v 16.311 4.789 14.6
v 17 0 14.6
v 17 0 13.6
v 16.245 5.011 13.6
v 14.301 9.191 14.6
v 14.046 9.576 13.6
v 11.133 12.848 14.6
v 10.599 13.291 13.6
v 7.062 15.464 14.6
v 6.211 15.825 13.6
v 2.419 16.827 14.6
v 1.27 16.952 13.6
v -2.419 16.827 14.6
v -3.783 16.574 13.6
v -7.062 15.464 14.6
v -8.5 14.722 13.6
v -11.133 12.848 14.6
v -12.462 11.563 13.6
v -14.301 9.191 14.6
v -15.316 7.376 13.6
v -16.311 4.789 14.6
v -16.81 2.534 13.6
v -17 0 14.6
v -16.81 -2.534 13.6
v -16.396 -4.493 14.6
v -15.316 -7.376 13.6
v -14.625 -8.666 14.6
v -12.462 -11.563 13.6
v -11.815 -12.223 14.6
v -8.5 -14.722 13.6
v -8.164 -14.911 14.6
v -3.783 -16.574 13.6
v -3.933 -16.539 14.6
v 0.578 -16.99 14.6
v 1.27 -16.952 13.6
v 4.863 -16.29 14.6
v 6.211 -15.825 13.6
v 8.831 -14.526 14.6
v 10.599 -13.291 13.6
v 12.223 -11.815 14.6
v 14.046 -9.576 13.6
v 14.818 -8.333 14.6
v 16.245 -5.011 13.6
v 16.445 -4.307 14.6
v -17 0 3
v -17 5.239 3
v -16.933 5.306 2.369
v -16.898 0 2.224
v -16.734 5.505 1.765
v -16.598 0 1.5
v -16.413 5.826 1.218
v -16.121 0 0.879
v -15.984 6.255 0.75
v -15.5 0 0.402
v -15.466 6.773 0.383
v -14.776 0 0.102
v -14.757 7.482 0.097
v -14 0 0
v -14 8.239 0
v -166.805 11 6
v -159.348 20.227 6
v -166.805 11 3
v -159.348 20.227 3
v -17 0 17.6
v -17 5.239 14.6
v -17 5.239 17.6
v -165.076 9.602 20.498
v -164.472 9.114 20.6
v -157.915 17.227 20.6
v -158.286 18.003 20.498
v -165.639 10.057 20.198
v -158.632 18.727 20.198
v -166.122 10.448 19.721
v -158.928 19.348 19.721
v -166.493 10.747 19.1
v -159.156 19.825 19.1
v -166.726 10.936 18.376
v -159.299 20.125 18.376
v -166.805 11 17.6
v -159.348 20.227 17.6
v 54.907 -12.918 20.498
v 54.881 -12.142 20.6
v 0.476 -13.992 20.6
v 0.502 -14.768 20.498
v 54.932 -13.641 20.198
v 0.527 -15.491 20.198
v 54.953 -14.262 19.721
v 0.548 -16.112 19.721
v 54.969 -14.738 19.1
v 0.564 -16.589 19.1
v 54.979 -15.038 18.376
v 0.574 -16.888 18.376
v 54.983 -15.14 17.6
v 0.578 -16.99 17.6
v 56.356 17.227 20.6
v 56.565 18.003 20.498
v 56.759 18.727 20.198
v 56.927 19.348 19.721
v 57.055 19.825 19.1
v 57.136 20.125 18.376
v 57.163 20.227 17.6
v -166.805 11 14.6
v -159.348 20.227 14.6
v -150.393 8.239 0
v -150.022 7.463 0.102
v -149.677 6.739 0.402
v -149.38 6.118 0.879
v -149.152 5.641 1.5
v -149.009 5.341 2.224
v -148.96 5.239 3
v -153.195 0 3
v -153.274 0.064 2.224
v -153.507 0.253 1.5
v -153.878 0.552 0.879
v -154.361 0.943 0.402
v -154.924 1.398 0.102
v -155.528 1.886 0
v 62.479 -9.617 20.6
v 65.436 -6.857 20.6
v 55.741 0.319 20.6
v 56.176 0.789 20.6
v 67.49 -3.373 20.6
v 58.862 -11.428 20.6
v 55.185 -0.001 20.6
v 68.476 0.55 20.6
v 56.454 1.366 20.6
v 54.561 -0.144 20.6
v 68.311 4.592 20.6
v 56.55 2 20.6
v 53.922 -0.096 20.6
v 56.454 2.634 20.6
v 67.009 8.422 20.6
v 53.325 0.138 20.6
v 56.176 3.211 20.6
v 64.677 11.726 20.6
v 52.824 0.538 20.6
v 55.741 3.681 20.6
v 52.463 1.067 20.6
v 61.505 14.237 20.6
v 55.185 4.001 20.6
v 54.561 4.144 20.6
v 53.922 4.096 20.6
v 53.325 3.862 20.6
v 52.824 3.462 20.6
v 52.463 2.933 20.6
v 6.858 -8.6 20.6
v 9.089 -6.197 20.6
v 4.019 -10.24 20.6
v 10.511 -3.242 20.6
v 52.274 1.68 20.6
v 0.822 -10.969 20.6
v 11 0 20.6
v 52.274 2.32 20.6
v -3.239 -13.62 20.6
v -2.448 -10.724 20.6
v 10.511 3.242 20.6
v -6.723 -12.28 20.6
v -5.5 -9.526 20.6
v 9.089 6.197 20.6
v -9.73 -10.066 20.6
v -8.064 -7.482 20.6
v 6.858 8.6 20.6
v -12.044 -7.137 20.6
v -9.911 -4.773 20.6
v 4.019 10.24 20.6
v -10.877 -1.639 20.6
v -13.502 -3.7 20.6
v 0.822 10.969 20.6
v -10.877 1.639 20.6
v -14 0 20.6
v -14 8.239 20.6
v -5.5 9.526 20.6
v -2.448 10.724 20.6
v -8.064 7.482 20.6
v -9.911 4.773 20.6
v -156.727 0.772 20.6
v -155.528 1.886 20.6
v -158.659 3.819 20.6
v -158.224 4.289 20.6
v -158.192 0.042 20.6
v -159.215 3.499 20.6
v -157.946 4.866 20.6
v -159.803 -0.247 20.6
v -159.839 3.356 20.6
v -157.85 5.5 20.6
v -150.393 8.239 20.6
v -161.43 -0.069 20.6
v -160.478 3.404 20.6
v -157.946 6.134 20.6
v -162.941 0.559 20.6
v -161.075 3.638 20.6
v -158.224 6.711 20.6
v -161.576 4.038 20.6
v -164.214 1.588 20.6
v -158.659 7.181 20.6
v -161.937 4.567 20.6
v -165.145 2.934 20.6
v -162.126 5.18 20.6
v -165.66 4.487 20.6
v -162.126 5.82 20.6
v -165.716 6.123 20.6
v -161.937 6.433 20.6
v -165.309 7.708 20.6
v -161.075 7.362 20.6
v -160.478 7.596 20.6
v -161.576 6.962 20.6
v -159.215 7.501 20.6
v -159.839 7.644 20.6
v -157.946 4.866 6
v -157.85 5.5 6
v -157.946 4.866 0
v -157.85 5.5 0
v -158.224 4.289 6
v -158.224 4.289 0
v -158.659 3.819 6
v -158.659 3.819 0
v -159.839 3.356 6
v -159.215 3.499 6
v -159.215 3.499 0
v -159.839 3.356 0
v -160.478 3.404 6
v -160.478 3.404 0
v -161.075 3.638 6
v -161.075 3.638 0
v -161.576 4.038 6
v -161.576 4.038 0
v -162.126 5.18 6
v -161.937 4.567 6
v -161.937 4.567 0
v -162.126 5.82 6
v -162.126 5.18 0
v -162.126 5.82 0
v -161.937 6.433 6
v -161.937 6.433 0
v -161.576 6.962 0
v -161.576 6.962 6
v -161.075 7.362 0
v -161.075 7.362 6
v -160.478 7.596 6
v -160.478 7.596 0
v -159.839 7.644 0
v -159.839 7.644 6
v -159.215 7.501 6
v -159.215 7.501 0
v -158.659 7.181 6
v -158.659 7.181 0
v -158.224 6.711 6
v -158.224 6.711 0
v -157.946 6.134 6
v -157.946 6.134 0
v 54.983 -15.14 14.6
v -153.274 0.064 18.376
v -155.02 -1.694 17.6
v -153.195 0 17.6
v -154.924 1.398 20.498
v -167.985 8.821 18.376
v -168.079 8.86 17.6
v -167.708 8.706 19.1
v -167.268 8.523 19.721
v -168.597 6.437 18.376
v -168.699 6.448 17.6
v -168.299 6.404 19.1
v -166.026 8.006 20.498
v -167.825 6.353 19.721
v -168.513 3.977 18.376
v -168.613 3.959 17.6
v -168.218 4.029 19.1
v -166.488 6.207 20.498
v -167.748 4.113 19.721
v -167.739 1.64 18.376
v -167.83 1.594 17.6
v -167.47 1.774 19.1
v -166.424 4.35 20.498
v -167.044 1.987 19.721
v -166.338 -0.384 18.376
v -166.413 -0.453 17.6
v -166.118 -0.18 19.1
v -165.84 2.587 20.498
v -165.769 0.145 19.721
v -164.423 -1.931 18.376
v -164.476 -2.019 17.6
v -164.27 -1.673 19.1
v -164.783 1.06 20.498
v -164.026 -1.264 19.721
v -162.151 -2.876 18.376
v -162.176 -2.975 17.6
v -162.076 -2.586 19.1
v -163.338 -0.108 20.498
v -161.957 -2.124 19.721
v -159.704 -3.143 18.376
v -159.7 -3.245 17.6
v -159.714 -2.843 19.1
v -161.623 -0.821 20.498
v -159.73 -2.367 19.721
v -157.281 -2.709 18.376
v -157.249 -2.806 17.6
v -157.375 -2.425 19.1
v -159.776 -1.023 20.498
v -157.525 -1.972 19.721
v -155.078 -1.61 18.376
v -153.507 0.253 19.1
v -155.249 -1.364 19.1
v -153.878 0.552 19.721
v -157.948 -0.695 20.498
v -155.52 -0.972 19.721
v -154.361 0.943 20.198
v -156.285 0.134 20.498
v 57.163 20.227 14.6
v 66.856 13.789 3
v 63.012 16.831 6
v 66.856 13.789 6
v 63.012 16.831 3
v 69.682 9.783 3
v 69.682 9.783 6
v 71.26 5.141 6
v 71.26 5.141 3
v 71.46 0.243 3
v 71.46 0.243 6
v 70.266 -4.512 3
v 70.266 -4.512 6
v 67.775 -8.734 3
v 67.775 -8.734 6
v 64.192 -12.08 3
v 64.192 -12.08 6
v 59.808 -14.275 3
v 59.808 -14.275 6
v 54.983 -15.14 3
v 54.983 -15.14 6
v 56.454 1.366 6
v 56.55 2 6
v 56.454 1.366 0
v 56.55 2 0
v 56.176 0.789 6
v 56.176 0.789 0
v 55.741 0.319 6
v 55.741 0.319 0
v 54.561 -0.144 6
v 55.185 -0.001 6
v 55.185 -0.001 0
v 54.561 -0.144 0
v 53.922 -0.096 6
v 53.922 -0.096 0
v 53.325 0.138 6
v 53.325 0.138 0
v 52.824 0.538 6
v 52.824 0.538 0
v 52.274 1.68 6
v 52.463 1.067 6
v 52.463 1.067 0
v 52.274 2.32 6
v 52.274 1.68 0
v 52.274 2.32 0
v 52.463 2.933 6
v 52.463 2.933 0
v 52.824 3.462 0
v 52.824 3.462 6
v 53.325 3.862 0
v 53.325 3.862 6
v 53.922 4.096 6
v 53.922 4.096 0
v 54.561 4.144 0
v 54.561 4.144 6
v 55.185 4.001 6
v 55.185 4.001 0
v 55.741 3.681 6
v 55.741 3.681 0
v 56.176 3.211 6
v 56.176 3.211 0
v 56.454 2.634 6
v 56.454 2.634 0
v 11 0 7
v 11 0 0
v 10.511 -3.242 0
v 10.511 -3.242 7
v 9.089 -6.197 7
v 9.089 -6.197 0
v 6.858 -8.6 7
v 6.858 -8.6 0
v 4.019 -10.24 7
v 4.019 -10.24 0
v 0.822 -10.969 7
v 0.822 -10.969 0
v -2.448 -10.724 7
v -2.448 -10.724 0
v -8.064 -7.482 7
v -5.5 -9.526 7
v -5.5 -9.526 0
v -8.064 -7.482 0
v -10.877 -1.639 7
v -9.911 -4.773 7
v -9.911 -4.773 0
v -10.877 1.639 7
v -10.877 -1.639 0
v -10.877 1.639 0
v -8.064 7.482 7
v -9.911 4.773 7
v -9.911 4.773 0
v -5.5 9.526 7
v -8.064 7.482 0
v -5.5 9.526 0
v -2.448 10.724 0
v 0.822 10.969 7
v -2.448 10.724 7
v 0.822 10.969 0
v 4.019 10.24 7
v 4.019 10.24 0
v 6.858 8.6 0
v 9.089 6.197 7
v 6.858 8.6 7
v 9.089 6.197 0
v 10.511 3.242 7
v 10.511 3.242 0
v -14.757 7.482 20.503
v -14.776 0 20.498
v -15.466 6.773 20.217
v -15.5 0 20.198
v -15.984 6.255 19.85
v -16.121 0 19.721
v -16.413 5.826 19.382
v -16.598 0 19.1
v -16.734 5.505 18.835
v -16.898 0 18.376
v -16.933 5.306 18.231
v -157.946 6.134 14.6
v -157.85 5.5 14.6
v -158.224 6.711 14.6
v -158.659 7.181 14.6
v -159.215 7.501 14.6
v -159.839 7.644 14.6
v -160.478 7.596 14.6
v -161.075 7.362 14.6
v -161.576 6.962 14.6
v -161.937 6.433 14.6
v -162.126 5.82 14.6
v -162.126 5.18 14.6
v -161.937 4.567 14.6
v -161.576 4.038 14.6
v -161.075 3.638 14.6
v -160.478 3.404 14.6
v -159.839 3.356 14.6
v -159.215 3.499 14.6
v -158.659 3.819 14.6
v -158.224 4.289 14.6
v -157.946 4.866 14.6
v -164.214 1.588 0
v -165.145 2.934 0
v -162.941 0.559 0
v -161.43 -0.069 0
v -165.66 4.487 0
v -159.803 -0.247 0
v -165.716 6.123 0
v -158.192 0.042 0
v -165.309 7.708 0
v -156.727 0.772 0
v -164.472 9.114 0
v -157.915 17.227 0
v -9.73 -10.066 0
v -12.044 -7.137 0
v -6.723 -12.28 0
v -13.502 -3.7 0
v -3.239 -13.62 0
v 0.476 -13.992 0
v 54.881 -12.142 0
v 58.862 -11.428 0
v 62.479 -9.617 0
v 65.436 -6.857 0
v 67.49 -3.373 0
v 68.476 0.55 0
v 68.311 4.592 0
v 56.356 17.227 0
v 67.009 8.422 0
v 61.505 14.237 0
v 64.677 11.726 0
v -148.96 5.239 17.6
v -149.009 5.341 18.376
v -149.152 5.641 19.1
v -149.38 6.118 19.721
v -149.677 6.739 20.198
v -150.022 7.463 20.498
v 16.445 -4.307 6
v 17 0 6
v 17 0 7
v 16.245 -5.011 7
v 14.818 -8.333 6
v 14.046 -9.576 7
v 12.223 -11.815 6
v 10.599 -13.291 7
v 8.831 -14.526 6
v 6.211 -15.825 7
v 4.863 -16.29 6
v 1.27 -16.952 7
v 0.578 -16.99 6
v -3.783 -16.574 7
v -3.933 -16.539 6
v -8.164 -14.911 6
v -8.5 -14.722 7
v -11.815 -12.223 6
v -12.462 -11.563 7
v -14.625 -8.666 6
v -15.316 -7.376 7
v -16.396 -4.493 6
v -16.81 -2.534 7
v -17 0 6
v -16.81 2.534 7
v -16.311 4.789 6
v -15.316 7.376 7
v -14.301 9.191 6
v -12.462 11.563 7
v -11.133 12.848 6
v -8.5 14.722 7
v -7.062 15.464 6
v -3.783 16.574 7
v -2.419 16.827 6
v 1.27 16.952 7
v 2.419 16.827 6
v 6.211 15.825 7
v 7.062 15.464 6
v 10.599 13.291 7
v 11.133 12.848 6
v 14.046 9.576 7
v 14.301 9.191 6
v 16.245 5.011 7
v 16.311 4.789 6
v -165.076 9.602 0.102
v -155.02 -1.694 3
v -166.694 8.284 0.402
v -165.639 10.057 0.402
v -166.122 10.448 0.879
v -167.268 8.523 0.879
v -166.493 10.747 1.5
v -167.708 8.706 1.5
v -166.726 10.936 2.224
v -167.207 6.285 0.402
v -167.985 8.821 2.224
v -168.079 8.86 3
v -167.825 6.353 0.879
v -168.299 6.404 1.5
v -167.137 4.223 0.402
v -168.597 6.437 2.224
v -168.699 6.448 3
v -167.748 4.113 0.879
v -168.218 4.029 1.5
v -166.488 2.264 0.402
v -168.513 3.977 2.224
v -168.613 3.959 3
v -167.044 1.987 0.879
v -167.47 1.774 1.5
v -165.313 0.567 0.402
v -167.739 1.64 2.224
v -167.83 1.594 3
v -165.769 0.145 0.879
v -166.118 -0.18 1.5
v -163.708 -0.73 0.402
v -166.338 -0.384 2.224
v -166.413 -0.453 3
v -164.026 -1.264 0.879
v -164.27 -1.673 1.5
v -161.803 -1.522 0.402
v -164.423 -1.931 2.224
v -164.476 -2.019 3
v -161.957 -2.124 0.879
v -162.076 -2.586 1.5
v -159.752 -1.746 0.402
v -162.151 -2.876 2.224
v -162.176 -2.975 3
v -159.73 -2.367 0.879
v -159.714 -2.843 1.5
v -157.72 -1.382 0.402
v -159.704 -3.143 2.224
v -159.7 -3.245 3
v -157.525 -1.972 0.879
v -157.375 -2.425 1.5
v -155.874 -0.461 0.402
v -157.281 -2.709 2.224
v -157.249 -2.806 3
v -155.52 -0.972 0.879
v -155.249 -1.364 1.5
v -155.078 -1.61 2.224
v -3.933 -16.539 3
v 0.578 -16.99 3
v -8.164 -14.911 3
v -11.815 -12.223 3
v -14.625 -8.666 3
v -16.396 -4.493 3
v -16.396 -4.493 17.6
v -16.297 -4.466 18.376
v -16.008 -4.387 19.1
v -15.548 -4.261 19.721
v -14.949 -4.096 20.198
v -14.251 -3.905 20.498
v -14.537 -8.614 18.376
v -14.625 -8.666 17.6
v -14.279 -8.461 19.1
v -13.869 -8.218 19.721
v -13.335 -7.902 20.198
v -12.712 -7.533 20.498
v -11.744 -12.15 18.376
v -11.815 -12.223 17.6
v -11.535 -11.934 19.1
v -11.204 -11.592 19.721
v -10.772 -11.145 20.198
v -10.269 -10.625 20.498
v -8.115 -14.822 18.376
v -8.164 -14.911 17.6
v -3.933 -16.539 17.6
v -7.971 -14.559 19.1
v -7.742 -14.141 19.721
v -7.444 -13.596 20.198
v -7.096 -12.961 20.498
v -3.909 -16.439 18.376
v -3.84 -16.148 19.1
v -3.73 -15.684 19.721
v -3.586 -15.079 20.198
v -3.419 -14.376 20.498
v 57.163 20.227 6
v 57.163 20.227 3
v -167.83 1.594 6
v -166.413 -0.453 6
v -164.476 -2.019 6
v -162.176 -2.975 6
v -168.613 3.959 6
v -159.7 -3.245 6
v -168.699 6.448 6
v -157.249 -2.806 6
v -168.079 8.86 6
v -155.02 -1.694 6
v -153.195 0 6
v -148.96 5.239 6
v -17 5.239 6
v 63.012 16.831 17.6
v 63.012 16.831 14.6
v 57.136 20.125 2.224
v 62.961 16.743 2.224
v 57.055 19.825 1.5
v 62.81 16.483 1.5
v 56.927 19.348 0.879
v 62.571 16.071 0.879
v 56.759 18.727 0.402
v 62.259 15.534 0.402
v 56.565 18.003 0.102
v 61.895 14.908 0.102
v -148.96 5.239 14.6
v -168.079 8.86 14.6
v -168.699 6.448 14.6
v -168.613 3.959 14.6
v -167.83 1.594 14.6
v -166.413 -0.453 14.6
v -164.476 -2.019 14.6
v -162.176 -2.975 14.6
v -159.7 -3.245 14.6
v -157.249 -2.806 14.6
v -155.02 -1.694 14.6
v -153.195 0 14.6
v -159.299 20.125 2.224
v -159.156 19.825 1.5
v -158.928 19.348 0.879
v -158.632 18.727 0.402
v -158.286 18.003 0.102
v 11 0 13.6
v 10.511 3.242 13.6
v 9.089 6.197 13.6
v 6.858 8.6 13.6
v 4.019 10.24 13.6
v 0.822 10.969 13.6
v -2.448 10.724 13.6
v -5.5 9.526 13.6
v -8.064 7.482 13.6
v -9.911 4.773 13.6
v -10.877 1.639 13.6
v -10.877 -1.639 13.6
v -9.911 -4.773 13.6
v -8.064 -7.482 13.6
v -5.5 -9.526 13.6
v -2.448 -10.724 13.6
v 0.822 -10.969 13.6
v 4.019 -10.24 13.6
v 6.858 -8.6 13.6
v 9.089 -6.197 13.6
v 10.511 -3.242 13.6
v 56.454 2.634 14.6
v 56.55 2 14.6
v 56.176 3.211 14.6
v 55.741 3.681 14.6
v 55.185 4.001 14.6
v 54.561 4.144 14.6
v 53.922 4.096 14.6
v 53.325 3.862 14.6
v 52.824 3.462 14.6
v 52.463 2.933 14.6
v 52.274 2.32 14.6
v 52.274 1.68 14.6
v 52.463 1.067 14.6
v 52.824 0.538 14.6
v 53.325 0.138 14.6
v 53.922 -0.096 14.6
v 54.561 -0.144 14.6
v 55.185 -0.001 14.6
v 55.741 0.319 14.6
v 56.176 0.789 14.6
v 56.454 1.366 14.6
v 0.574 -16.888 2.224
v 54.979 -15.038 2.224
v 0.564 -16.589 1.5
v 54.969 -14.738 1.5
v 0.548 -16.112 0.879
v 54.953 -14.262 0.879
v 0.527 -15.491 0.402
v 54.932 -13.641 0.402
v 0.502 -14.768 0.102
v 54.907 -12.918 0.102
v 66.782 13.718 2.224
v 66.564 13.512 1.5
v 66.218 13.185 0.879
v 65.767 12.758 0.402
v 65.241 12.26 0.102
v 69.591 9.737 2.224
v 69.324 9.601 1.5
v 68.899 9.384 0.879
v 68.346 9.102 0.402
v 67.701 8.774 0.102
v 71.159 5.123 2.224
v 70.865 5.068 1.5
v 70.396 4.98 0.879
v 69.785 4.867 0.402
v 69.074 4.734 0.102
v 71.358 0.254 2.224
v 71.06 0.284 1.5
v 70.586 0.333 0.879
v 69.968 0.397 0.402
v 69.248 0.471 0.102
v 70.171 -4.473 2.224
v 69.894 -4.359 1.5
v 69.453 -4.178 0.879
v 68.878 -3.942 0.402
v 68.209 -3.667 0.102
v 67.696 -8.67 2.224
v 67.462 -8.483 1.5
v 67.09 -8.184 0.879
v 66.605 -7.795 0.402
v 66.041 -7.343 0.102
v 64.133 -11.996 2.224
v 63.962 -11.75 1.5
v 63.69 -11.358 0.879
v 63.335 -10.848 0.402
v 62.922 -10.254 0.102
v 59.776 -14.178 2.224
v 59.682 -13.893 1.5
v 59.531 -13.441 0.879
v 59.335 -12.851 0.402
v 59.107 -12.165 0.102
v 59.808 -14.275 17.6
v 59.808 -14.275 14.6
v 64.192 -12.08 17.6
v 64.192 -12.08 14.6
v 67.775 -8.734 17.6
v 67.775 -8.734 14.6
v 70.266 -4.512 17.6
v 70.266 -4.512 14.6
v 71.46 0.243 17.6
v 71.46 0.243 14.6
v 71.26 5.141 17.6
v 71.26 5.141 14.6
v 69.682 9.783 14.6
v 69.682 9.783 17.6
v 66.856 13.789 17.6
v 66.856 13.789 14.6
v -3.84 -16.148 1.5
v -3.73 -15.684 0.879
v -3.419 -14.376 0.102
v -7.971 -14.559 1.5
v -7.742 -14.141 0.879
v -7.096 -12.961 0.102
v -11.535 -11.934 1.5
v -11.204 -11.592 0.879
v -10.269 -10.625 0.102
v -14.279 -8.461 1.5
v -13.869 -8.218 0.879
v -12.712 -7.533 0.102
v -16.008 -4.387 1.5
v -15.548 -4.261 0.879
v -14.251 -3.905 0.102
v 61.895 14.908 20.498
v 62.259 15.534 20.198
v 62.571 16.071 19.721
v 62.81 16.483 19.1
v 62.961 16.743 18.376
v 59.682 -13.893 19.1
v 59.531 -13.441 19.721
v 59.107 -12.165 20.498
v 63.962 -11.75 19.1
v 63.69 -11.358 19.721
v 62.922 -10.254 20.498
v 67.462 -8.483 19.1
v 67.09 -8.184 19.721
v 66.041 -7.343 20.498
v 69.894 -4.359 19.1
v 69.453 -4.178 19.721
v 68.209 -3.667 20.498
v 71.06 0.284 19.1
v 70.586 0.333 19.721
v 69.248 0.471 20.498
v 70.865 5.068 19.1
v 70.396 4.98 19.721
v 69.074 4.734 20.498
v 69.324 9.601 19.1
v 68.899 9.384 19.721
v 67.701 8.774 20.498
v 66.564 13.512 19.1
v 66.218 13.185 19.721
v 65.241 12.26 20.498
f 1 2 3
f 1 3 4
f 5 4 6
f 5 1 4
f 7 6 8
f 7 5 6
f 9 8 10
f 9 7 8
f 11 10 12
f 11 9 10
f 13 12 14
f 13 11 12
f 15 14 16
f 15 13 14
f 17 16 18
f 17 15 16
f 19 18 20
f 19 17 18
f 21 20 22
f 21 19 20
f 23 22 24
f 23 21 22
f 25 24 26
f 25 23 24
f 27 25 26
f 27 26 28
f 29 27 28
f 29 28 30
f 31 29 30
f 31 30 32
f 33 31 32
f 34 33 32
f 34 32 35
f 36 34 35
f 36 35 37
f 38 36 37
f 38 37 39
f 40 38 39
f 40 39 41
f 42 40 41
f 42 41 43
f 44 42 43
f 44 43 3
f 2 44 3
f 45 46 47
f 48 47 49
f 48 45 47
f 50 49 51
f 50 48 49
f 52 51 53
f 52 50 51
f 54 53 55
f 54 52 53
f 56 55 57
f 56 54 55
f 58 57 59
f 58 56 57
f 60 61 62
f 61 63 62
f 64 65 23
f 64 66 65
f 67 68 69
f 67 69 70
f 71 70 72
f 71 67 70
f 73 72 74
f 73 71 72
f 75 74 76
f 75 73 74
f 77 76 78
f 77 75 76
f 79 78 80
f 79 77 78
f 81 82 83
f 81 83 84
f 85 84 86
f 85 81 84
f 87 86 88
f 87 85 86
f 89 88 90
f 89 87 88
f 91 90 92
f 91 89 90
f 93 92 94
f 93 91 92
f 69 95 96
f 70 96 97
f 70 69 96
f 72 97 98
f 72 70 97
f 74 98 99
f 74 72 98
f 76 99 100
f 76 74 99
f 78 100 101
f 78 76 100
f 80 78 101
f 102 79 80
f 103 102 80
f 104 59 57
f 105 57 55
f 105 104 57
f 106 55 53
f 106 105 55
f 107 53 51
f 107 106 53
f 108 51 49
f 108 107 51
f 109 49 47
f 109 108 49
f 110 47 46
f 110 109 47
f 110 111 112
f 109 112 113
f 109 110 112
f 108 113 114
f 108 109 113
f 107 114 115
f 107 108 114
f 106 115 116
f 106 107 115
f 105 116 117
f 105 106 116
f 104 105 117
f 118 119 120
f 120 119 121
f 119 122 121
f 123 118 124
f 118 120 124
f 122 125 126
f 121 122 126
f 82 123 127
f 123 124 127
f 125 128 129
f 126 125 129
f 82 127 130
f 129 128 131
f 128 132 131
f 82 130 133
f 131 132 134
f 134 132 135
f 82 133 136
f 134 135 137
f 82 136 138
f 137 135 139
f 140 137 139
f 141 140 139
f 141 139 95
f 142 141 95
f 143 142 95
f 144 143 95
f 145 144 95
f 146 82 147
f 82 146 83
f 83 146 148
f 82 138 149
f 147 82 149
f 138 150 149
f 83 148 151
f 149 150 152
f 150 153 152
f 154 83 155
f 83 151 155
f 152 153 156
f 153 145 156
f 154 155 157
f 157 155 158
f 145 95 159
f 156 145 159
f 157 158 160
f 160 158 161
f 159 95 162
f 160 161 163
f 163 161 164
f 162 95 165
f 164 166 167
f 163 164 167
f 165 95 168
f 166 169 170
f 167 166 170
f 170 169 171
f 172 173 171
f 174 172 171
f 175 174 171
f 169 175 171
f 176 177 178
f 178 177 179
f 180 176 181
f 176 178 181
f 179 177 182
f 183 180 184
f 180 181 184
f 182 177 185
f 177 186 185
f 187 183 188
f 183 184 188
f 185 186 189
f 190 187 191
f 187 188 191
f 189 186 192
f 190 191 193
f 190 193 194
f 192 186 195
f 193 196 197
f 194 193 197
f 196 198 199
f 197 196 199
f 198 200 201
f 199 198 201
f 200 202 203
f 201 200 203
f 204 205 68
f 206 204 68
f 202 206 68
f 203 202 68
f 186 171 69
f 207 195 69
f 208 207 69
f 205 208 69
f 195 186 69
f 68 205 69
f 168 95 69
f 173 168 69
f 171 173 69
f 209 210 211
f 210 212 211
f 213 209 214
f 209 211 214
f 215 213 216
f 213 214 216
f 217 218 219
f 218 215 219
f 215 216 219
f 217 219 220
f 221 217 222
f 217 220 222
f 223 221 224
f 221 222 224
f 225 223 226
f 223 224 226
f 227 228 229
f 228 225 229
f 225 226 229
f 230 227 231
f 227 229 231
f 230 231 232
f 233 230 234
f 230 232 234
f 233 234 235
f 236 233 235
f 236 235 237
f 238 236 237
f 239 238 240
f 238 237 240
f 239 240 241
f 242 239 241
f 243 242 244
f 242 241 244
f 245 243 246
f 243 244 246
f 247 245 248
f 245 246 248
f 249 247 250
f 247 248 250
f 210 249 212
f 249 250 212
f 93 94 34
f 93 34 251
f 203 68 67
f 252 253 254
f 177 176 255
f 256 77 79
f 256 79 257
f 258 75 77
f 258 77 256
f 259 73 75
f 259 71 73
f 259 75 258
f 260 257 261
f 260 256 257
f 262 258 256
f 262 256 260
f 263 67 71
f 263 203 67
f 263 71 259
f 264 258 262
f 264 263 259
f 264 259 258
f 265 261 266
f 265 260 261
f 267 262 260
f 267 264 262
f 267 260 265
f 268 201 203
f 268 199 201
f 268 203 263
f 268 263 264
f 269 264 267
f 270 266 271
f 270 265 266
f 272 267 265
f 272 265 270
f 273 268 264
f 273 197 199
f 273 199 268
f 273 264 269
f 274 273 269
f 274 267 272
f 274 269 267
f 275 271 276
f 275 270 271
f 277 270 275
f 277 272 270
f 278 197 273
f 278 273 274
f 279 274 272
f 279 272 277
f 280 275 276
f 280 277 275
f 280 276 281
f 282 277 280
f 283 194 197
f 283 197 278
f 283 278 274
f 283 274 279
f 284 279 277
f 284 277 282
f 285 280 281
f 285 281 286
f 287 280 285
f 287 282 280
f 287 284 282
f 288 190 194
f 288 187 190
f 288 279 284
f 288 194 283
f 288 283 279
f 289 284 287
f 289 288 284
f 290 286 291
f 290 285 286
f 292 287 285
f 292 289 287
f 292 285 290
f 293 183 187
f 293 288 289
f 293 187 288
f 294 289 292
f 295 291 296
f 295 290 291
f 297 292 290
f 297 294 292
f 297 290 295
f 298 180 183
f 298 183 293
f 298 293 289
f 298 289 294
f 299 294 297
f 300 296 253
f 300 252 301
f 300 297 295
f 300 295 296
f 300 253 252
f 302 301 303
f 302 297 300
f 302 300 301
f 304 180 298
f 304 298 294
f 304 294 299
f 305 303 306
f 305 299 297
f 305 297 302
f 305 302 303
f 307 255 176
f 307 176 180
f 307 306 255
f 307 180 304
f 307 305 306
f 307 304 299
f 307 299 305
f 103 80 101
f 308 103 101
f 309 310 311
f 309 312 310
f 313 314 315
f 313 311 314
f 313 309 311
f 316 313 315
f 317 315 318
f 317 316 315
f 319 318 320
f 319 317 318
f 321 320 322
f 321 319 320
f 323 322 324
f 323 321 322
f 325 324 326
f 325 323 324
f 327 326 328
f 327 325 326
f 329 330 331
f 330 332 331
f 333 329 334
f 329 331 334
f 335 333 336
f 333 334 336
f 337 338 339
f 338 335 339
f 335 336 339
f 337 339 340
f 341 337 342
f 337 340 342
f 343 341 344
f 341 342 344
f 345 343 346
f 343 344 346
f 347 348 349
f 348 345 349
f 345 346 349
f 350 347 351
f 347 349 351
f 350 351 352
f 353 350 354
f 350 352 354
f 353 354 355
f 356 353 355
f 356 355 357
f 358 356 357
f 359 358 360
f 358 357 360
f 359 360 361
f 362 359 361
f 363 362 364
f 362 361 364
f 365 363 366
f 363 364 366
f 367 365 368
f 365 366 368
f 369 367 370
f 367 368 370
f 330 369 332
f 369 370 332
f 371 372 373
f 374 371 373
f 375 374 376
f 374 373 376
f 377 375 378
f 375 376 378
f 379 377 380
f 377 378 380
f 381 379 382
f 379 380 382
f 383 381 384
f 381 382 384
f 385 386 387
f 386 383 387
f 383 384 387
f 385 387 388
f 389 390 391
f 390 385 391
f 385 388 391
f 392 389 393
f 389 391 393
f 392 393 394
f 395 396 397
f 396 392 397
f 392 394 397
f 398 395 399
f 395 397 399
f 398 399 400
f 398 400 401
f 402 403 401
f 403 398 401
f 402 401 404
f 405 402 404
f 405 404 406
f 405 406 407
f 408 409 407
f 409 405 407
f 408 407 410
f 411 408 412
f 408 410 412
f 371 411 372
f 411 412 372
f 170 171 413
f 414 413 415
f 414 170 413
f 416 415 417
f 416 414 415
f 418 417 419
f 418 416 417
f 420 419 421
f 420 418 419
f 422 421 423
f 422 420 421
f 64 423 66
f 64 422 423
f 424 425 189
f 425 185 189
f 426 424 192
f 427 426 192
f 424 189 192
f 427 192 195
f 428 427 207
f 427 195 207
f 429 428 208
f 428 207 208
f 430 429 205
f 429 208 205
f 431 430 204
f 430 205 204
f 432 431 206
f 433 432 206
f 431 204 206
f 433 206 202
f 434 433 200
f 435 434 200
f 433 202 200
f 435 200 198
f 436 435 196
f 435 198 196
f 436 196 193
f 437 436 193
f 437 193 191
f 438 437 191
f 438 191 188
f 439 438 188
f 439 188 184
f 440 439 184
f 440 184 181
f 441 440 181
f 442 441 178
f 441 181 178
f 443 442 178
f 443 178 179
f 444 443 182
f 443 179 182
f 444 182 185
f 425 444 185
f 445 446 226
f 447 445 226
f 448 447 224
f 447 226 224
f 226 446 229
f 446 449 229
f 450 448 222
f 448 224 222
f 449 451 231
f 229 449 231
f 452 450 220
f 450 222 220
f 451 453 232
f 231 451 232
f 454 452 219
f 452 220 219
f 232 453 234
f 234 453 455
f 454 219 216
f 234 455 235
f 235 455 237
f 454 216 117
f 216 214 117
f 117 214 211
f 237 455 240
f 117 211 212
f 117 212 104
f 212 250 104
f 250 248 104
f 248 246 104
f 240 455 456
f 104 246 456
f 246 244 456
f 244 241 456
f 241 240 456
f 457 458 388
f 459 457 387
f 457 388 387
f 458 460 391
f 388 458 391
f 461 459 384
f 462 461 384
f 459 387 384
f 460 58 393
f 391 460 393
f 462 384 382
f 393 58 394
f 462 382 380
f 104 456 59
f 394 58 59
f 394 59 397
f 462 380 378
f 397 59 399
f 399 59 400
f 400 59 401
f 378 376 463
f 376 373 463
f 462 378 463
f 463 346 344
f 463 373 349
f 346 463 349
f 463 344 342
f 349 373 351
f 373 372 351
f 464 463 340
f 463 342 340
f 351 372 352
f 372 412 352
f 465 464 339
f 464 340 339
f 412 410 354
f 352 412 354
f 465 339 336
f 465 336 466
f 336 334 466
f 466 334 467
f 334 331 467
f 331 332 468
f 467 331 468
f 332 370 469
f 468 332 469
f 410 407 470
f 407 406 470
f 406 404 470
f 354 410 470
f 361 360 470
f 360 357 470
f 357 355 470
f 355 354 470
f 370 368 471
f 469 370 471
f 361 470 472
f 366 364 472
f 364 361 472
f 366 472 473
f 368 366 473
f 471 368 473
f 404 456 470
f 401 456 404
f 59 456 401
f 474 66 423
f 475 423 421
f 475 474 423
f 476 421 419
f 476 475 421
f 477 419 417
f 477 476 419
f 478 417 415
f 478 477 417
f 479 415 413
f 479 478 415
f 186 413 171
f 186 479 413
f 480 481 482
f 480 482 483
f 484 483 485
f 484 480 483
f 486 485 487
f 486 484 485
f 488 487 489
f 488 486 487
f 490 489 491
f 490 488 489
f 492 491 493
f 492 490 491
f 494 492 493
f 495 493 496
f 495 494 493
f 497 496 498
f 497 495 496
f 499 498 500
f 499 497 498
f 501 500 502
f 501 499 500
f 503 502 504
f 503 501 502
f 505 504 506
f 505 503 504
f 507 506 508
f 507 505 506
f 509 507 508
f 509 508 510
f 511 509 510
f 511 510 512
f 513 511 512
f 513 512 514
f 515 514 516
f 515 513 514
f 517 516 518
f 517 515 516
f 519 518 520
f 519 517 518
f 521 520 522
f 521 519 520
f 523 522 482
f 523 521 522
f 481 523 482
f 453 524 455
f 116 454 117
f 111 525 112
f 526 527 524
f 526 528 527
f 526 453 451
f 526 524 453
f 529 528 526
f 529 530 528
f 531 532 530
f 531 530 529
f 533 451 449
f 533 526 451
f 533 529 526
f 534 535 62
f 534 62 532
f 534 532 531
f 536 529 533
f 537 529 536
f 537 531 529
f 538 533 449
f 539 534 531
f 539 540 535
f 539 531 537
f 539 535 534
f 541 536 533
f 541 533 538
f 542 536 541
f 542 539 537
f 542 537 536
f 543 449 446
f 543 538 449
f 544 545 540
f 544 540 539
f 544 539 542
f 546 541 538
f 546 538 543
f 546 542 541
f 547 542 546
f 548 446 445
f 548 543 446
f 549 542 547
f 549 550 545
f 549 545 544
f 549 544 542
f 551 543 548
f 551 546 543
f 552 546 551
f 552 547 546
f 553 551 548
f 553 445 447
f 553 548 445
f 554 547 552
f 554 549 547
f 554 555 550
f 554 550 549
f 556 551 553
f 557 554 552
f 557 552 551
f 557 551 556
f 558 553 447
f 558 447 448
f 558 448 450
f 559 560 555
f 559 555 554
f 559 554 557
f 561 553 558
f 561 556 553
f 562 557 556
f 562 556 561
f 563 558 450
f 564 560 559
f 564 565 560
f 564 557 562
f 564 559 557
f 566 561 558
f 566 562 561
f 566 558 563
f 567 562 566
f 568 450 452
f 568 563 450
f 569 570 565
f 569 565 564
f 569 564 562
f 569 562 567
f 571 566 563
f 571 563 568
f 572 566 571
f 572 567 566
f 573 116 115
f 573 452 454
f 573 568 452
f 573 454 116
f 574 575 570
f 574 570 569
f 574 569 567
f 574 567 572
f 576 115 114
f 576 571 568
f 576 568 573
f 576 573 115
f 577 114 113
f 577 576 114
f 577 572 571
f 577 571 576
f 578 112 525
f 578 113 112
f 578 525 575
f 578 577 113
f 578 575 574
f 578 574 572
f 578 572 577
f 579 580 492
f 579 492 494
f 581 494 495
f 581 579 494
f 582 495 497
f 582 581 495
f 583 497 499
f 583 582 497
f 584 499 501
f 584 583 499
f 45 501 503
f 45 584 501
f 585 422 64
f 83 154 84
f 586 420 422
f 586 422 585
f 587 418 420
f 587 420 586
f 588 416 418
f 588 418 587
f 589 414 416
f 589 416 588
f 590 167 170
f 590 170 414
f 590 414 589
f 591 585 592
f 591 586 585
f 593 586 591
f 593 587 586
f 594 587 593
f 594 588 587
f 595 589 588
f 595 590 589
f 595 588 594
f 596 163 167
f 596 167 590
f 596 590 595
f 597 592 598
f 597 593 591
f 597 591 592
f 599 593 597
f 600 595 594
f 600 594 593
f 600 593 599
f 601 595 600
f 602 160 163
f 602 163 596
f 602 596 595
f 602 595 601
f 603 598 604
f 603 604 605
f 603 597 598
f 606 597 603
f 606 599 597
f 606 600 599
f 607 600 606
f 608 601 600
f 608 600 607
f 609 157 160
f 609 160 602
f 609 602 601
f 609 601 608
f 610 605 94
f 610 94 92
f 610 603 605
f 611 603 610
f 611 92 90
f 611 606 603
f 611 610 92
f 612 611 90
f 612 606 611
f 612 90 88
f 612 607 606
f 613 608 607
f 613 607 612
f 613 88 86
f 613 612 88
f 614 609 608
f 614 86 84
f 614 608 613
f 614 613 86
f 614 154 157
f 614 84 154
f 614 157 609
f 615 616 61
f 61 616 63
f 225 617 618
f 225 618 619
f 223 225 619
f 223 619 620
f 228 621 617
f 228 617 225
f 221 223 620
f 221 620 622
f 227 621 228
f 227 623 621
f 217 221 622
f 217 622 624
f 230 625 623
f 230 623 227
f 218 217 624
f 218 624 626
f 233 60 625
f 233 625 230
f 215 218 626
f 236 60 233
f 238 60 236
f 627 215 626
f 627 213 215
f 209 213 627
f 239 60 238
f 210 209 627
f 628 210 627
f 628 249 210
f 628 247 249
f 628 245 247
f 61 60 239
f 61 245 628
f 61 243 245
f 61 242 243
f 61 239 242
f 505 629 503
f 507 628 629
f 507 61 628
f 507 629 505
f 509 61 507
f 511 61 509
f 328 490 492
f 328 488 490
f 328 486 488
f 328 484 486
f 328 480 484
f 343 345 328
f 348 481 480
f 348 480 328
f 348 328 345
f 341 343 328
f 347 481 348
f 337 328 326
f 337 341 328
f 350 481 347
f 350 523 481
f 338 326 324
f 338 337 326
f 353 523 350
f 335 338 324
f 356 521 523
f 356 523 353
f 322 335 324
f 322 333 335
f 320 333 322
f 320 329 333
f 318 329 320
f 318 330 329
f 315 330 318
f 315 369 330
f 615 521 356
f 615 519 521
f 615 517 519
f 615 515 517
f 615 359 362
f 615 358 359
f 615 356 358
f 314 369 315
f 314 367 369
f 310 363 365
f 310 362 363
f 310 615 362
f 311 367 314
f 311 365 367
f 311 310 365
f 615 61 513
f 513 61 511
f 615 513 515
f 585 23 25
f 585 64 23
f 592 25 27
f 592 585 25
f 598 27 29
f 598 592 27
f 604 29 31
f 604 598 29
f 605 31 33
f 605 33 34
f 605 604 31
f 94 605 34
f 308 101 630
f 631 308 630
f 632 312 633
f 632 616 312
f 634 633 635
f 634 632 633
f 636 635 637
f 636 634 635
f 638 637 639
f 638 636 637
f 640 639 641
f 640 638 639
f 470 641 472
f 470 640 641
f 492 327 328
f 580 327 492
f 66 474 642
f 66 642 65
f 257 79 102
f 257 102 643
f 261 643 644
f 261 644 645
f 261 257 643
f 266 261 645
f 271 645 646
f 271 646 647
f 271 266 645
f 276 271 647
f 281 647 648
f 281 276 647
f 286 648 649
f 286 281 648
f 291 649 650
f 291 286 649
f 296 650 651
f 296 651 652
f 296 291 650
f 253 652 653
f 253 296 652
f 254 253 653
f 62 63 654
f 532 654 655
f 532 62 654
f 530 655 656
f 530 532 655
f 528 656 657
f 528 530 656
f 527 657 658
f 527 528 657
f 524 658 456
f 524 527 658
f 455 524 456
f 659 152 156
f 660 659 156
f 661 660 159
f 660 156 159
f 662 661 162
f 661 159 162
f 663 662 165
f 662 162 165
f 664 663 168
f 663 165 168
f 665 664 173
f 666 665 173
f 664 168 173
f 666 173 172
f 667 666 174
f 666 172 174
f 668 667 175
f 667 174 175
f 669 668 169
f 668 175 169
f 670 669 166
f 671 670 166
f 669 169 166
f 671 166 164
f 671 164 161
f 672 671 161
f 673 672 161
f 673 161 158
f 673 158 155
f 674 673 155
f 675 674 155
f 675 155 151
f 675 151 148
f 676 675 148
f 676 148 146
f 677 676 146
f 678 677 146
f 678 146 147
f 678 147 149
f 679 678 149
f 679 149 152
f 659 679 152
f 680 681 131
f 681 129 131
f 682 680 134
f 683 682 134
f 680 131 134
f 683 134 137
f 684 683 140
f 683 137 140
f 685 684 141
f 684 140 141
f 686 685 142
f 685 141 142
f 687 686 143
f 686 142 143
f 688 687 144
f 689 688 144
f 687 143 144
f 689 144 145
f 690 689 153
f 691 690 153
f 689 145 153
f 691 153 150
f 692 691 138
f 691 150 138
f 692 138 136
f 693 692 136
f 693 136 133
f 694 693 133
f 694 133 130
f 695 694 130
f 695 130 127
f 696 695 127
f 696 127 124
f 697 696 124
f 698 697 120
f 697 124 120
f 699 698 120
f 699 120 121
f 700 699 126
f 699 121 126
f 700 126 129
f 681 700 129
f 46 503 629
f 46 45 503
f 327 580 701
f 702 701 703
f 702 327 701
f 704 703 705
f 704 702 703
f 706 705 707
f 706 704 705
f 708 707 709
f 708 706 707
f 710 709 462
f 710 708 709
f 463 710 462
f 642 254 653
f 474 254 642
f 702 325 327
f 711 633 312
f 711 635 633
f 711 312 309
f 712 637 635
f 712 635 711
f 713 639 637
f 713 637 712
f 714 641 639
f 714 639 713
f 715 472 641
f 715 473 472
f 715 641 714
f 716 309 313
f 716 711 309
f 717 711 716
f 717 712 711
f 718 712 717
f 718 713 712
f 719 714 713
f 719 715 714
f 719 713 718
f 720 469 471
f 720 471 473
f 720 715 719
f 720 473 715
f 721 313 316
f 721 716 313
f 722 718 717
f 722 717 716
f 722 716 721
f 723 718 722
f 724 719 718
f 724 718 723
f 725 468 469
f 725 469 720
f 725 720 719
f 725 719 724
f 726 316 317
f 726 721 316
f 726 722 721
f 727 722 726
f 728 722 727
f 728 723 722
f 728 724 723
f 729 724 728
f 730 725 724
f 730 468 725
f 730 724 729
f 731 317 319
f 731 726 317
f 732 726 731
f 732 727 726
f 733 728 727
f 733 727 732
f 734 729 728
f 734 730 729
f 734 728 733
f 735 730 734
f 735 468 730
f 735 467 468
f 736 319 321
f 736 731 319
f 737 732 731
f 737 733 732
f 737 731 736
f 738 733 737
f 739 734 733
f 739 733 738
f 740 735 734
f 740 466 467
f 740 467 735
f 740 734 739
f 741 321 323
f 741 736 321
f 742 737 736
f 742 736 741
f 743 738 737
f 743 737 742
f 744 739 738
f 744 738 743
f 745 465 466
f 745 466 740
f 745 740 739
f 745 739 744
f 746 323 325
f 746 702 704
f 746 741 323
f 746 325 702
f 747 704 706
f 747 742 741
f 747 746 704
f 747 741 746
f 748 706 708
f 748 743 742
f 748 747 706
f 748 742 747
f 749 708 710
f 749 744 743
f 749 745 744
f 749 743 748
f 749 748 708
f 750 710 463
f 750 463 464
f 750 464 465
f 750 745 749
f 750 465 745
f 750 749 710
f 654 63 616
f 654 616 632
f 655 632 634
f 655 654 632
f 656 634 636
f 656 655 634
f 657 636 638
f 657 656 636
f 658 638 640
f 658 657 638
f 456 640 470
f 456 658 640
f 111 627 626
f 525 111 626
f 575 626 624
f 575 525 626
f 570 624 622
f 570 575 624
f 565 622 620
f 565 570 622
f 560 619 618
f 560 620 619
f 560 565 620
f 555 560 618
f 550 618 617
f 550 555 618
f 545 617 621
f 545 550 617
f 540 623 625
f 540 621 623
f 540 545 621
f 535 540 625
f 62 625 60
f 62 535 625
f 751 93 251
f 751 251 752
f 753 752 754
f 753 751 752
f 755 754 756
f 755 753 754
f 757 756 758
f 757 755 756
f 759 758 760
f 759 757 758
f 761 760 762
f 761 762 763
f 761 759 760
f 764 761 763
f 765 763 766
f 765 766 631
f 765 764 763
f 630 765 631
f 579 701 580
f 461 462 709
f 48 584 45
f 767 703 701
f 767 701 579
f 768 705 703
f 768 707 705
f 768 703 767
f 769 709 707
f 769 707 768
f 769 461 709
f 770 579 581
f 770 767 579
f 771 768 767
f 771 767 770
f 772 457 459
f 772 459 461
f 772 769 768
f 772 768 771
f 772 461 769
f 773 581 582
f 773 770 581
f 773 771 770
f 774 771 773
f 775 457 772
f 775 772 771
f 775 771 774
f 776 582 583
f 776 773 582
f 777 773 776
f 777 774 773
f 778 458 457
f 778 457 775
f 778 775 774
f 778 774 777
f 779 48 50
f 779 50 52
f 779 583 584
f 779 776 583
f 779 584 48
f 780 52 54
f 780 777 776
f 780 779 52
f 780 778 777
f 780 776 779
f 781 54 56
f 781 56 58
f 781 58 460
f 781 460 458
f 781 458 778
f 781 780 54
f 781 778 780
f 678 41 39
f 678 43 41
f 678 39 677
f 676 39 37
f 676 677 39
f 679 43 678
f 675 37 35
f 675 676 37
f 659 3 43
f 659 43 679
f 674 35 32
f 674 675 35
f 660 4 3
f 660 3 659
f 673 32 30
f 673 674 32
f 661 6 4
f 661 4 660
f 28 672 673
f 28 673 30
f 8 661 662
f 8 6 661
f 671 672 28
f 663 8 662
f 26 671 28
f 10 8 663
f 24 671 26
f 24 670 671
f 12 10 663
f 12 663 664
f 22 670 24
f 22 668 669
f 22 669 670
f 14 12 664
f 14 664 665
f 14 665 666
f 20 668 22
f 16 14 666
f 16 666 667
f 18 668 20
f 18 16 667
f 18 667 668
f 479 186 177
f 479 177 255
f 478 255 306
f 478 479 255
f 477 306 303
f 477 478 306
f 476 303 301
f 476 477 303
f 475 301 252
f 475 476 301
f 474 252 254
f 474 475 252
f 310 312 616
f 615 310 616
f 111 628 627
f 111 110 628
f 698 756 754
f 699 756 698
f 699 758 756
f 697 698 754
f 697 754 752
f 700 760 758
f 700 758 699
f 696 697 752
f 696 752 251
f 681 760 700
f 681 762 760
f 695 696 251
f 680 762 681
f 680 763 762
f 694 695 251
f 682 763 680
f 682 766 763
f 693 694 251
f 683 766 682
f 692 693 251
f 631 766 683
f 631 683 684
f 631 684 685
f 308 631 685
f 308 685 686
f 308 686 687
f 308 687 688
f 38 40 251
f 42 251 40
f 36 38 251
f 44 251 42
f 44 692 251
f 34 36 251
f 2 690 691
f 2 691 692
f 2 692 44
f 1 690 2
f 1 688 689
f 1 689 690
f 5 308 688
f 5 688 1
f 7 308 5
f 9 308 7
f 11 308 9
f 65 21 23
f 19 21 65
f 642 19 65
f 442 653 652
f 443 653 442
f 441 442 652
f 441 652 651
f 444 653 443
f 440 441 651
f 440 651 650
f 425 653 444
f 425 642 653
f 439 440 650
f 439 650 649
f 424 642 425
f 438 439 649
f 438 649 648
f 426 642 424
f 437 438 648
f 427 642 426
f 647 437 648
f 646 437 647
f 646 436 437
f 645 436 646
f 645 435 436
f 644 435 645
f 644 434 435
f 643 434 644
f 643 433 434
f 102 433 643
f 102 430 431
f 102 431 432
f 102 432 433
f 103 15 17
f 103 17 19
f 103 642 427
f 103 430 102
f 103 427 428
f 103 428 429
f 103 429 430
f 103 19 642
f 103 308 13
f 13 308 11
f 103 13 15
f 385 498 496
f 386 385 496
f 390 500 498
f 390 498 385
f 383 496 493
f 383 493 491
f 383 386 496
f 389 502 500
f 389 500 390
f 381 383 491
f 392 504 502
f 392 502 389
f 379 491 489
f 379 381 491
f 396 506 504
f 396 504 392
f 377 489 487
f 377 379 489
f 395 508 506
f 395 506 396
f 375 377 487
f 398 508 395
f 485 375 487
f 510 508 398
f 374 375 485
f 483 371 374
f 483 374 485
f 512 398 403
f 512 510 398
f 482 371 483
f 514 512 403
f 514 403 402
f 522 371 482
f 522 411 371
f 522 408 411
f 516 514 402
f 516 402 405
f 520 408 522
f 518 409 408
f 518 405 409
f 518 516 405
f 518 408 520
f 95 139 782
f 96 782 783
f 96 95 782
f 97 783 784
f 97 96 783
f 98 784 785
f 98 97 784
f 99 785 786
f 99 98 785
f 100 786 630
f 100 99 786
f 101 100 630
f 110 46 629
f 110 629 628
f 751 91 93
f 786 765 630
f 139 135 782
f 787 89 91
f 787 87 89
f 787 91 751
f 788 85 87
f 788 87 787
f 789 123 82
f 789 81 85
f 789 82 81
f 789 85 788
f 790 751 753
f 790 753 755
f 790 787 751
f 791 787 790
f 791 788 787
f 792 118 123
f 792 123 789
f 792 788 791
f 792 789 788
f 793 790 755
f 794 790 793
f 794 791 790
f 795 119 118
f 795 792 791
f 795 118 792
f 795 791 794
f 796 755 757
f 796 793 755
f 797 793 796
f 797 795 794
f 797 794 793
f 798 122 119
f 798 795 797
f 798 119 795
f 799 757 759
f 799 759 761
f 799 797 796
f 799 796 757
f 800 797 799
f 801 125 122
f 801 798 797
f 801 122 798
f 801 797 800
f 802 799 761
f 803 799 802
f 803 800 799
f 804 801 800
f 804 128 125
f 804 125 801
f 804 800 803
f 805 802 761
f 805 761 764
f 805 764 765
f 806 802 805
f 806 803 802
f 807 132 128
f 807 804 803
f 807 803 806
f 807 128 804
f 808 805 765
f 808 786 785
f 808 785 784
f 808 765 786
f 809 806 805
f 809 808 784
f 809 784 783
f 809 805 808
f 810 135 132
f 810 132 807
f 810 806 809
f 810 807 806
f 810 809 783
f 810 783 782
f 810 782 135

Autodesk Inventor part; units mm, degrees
ref_plane "YZ Plane" through (0, 0, 0) normal (1, 0, 0) x (0, 1, 0)
ref_plane "XZ Plane" through (0, 0, 0) normal (0, 1, 0) x (-1, 0, 0)
sketch "Sketch1" plane through (0, 0, 0) normal (0, 0, 1) x (1, 0, 0)
  circle A0 centre (0, 0) radius 11
  circle A1 centre (-160, 5.5) radius 2.15
  circle A2 centre (54.4, 2) radius 2.15
  arc A3 (54.9829, -15.1401) -> (63.0119, 16.831) centre (54.4, 2) ccw
  arc A4 (-166.8053, 11) -> (-153.1947, 0) centre (-160, 5.5) ccw
  arc A5 (-17, 0) -> (0.5778, -16.9902) centre (0, 0) ccw
  line L0 (-262.8088, 0) -> (191.982, 0) construction
  line L1 (54.9829, -15.1401) -> (0.5778, -16.9902)
  line L2 (63.0119, 16.831) -> (57.1634, 20.227)
  line L3 (57.1634, 20.227) -> (-159.3481, 20.227)
  line L4 (-159.3481, 20.227) -> (-166.8053, 11)
  line L5 (-17, 0) -> (-17, 5.239)
  line L6 (-17, 5.239) -> (-148.9605, 5.239)
  line L7 (-148.9605, 5.239) -> (-153.1947, 0)
  dimension "d0" = 22
  dimension "d1" = 4.3
  dimension "d2" = 160
  dimension "d3" = 5.5
  dimension "d4" = 4.3
  dimension "d5" = 54.4
  dimension "d6" = 2
  dimension "d7" = 15
  dimension "d9" = 6
  dimension "d20" = 6.6
extrude "Extrusion1" add sketch "Sketch1" along normal blind 6
sketch "Sketch2" plane through (0, 0, 6) normal (0, 0, 1) x (1, 0, 0)
  circle A0 centre (0, 0) radius 11 projected
  circle A1 centre (0, 0) radius 17
extrude "Extrusion2" add sketch "Sketch2" along normal blind 1
fillet "Fillet2" radius 3 5 edges at (-165.5, -1.3053, 0) (-11.8148, -12.2234, 0) (71.0335, -2.1772, 0) (-51.0924, 20.227, 0) (-82.9803, 5.239, 0)
ref_plane "Work Plane1" through (0, 0, 10.3) normal (0, 0, -1) x (-1, 0, 0)
mirror "Mirror2" about plane through (0, 0, 10.3) normal (0, 0, -1) of "Extrusion1", "Fillet2", "Extrusion2"
properties part number "Arm 20X - forearm r"
